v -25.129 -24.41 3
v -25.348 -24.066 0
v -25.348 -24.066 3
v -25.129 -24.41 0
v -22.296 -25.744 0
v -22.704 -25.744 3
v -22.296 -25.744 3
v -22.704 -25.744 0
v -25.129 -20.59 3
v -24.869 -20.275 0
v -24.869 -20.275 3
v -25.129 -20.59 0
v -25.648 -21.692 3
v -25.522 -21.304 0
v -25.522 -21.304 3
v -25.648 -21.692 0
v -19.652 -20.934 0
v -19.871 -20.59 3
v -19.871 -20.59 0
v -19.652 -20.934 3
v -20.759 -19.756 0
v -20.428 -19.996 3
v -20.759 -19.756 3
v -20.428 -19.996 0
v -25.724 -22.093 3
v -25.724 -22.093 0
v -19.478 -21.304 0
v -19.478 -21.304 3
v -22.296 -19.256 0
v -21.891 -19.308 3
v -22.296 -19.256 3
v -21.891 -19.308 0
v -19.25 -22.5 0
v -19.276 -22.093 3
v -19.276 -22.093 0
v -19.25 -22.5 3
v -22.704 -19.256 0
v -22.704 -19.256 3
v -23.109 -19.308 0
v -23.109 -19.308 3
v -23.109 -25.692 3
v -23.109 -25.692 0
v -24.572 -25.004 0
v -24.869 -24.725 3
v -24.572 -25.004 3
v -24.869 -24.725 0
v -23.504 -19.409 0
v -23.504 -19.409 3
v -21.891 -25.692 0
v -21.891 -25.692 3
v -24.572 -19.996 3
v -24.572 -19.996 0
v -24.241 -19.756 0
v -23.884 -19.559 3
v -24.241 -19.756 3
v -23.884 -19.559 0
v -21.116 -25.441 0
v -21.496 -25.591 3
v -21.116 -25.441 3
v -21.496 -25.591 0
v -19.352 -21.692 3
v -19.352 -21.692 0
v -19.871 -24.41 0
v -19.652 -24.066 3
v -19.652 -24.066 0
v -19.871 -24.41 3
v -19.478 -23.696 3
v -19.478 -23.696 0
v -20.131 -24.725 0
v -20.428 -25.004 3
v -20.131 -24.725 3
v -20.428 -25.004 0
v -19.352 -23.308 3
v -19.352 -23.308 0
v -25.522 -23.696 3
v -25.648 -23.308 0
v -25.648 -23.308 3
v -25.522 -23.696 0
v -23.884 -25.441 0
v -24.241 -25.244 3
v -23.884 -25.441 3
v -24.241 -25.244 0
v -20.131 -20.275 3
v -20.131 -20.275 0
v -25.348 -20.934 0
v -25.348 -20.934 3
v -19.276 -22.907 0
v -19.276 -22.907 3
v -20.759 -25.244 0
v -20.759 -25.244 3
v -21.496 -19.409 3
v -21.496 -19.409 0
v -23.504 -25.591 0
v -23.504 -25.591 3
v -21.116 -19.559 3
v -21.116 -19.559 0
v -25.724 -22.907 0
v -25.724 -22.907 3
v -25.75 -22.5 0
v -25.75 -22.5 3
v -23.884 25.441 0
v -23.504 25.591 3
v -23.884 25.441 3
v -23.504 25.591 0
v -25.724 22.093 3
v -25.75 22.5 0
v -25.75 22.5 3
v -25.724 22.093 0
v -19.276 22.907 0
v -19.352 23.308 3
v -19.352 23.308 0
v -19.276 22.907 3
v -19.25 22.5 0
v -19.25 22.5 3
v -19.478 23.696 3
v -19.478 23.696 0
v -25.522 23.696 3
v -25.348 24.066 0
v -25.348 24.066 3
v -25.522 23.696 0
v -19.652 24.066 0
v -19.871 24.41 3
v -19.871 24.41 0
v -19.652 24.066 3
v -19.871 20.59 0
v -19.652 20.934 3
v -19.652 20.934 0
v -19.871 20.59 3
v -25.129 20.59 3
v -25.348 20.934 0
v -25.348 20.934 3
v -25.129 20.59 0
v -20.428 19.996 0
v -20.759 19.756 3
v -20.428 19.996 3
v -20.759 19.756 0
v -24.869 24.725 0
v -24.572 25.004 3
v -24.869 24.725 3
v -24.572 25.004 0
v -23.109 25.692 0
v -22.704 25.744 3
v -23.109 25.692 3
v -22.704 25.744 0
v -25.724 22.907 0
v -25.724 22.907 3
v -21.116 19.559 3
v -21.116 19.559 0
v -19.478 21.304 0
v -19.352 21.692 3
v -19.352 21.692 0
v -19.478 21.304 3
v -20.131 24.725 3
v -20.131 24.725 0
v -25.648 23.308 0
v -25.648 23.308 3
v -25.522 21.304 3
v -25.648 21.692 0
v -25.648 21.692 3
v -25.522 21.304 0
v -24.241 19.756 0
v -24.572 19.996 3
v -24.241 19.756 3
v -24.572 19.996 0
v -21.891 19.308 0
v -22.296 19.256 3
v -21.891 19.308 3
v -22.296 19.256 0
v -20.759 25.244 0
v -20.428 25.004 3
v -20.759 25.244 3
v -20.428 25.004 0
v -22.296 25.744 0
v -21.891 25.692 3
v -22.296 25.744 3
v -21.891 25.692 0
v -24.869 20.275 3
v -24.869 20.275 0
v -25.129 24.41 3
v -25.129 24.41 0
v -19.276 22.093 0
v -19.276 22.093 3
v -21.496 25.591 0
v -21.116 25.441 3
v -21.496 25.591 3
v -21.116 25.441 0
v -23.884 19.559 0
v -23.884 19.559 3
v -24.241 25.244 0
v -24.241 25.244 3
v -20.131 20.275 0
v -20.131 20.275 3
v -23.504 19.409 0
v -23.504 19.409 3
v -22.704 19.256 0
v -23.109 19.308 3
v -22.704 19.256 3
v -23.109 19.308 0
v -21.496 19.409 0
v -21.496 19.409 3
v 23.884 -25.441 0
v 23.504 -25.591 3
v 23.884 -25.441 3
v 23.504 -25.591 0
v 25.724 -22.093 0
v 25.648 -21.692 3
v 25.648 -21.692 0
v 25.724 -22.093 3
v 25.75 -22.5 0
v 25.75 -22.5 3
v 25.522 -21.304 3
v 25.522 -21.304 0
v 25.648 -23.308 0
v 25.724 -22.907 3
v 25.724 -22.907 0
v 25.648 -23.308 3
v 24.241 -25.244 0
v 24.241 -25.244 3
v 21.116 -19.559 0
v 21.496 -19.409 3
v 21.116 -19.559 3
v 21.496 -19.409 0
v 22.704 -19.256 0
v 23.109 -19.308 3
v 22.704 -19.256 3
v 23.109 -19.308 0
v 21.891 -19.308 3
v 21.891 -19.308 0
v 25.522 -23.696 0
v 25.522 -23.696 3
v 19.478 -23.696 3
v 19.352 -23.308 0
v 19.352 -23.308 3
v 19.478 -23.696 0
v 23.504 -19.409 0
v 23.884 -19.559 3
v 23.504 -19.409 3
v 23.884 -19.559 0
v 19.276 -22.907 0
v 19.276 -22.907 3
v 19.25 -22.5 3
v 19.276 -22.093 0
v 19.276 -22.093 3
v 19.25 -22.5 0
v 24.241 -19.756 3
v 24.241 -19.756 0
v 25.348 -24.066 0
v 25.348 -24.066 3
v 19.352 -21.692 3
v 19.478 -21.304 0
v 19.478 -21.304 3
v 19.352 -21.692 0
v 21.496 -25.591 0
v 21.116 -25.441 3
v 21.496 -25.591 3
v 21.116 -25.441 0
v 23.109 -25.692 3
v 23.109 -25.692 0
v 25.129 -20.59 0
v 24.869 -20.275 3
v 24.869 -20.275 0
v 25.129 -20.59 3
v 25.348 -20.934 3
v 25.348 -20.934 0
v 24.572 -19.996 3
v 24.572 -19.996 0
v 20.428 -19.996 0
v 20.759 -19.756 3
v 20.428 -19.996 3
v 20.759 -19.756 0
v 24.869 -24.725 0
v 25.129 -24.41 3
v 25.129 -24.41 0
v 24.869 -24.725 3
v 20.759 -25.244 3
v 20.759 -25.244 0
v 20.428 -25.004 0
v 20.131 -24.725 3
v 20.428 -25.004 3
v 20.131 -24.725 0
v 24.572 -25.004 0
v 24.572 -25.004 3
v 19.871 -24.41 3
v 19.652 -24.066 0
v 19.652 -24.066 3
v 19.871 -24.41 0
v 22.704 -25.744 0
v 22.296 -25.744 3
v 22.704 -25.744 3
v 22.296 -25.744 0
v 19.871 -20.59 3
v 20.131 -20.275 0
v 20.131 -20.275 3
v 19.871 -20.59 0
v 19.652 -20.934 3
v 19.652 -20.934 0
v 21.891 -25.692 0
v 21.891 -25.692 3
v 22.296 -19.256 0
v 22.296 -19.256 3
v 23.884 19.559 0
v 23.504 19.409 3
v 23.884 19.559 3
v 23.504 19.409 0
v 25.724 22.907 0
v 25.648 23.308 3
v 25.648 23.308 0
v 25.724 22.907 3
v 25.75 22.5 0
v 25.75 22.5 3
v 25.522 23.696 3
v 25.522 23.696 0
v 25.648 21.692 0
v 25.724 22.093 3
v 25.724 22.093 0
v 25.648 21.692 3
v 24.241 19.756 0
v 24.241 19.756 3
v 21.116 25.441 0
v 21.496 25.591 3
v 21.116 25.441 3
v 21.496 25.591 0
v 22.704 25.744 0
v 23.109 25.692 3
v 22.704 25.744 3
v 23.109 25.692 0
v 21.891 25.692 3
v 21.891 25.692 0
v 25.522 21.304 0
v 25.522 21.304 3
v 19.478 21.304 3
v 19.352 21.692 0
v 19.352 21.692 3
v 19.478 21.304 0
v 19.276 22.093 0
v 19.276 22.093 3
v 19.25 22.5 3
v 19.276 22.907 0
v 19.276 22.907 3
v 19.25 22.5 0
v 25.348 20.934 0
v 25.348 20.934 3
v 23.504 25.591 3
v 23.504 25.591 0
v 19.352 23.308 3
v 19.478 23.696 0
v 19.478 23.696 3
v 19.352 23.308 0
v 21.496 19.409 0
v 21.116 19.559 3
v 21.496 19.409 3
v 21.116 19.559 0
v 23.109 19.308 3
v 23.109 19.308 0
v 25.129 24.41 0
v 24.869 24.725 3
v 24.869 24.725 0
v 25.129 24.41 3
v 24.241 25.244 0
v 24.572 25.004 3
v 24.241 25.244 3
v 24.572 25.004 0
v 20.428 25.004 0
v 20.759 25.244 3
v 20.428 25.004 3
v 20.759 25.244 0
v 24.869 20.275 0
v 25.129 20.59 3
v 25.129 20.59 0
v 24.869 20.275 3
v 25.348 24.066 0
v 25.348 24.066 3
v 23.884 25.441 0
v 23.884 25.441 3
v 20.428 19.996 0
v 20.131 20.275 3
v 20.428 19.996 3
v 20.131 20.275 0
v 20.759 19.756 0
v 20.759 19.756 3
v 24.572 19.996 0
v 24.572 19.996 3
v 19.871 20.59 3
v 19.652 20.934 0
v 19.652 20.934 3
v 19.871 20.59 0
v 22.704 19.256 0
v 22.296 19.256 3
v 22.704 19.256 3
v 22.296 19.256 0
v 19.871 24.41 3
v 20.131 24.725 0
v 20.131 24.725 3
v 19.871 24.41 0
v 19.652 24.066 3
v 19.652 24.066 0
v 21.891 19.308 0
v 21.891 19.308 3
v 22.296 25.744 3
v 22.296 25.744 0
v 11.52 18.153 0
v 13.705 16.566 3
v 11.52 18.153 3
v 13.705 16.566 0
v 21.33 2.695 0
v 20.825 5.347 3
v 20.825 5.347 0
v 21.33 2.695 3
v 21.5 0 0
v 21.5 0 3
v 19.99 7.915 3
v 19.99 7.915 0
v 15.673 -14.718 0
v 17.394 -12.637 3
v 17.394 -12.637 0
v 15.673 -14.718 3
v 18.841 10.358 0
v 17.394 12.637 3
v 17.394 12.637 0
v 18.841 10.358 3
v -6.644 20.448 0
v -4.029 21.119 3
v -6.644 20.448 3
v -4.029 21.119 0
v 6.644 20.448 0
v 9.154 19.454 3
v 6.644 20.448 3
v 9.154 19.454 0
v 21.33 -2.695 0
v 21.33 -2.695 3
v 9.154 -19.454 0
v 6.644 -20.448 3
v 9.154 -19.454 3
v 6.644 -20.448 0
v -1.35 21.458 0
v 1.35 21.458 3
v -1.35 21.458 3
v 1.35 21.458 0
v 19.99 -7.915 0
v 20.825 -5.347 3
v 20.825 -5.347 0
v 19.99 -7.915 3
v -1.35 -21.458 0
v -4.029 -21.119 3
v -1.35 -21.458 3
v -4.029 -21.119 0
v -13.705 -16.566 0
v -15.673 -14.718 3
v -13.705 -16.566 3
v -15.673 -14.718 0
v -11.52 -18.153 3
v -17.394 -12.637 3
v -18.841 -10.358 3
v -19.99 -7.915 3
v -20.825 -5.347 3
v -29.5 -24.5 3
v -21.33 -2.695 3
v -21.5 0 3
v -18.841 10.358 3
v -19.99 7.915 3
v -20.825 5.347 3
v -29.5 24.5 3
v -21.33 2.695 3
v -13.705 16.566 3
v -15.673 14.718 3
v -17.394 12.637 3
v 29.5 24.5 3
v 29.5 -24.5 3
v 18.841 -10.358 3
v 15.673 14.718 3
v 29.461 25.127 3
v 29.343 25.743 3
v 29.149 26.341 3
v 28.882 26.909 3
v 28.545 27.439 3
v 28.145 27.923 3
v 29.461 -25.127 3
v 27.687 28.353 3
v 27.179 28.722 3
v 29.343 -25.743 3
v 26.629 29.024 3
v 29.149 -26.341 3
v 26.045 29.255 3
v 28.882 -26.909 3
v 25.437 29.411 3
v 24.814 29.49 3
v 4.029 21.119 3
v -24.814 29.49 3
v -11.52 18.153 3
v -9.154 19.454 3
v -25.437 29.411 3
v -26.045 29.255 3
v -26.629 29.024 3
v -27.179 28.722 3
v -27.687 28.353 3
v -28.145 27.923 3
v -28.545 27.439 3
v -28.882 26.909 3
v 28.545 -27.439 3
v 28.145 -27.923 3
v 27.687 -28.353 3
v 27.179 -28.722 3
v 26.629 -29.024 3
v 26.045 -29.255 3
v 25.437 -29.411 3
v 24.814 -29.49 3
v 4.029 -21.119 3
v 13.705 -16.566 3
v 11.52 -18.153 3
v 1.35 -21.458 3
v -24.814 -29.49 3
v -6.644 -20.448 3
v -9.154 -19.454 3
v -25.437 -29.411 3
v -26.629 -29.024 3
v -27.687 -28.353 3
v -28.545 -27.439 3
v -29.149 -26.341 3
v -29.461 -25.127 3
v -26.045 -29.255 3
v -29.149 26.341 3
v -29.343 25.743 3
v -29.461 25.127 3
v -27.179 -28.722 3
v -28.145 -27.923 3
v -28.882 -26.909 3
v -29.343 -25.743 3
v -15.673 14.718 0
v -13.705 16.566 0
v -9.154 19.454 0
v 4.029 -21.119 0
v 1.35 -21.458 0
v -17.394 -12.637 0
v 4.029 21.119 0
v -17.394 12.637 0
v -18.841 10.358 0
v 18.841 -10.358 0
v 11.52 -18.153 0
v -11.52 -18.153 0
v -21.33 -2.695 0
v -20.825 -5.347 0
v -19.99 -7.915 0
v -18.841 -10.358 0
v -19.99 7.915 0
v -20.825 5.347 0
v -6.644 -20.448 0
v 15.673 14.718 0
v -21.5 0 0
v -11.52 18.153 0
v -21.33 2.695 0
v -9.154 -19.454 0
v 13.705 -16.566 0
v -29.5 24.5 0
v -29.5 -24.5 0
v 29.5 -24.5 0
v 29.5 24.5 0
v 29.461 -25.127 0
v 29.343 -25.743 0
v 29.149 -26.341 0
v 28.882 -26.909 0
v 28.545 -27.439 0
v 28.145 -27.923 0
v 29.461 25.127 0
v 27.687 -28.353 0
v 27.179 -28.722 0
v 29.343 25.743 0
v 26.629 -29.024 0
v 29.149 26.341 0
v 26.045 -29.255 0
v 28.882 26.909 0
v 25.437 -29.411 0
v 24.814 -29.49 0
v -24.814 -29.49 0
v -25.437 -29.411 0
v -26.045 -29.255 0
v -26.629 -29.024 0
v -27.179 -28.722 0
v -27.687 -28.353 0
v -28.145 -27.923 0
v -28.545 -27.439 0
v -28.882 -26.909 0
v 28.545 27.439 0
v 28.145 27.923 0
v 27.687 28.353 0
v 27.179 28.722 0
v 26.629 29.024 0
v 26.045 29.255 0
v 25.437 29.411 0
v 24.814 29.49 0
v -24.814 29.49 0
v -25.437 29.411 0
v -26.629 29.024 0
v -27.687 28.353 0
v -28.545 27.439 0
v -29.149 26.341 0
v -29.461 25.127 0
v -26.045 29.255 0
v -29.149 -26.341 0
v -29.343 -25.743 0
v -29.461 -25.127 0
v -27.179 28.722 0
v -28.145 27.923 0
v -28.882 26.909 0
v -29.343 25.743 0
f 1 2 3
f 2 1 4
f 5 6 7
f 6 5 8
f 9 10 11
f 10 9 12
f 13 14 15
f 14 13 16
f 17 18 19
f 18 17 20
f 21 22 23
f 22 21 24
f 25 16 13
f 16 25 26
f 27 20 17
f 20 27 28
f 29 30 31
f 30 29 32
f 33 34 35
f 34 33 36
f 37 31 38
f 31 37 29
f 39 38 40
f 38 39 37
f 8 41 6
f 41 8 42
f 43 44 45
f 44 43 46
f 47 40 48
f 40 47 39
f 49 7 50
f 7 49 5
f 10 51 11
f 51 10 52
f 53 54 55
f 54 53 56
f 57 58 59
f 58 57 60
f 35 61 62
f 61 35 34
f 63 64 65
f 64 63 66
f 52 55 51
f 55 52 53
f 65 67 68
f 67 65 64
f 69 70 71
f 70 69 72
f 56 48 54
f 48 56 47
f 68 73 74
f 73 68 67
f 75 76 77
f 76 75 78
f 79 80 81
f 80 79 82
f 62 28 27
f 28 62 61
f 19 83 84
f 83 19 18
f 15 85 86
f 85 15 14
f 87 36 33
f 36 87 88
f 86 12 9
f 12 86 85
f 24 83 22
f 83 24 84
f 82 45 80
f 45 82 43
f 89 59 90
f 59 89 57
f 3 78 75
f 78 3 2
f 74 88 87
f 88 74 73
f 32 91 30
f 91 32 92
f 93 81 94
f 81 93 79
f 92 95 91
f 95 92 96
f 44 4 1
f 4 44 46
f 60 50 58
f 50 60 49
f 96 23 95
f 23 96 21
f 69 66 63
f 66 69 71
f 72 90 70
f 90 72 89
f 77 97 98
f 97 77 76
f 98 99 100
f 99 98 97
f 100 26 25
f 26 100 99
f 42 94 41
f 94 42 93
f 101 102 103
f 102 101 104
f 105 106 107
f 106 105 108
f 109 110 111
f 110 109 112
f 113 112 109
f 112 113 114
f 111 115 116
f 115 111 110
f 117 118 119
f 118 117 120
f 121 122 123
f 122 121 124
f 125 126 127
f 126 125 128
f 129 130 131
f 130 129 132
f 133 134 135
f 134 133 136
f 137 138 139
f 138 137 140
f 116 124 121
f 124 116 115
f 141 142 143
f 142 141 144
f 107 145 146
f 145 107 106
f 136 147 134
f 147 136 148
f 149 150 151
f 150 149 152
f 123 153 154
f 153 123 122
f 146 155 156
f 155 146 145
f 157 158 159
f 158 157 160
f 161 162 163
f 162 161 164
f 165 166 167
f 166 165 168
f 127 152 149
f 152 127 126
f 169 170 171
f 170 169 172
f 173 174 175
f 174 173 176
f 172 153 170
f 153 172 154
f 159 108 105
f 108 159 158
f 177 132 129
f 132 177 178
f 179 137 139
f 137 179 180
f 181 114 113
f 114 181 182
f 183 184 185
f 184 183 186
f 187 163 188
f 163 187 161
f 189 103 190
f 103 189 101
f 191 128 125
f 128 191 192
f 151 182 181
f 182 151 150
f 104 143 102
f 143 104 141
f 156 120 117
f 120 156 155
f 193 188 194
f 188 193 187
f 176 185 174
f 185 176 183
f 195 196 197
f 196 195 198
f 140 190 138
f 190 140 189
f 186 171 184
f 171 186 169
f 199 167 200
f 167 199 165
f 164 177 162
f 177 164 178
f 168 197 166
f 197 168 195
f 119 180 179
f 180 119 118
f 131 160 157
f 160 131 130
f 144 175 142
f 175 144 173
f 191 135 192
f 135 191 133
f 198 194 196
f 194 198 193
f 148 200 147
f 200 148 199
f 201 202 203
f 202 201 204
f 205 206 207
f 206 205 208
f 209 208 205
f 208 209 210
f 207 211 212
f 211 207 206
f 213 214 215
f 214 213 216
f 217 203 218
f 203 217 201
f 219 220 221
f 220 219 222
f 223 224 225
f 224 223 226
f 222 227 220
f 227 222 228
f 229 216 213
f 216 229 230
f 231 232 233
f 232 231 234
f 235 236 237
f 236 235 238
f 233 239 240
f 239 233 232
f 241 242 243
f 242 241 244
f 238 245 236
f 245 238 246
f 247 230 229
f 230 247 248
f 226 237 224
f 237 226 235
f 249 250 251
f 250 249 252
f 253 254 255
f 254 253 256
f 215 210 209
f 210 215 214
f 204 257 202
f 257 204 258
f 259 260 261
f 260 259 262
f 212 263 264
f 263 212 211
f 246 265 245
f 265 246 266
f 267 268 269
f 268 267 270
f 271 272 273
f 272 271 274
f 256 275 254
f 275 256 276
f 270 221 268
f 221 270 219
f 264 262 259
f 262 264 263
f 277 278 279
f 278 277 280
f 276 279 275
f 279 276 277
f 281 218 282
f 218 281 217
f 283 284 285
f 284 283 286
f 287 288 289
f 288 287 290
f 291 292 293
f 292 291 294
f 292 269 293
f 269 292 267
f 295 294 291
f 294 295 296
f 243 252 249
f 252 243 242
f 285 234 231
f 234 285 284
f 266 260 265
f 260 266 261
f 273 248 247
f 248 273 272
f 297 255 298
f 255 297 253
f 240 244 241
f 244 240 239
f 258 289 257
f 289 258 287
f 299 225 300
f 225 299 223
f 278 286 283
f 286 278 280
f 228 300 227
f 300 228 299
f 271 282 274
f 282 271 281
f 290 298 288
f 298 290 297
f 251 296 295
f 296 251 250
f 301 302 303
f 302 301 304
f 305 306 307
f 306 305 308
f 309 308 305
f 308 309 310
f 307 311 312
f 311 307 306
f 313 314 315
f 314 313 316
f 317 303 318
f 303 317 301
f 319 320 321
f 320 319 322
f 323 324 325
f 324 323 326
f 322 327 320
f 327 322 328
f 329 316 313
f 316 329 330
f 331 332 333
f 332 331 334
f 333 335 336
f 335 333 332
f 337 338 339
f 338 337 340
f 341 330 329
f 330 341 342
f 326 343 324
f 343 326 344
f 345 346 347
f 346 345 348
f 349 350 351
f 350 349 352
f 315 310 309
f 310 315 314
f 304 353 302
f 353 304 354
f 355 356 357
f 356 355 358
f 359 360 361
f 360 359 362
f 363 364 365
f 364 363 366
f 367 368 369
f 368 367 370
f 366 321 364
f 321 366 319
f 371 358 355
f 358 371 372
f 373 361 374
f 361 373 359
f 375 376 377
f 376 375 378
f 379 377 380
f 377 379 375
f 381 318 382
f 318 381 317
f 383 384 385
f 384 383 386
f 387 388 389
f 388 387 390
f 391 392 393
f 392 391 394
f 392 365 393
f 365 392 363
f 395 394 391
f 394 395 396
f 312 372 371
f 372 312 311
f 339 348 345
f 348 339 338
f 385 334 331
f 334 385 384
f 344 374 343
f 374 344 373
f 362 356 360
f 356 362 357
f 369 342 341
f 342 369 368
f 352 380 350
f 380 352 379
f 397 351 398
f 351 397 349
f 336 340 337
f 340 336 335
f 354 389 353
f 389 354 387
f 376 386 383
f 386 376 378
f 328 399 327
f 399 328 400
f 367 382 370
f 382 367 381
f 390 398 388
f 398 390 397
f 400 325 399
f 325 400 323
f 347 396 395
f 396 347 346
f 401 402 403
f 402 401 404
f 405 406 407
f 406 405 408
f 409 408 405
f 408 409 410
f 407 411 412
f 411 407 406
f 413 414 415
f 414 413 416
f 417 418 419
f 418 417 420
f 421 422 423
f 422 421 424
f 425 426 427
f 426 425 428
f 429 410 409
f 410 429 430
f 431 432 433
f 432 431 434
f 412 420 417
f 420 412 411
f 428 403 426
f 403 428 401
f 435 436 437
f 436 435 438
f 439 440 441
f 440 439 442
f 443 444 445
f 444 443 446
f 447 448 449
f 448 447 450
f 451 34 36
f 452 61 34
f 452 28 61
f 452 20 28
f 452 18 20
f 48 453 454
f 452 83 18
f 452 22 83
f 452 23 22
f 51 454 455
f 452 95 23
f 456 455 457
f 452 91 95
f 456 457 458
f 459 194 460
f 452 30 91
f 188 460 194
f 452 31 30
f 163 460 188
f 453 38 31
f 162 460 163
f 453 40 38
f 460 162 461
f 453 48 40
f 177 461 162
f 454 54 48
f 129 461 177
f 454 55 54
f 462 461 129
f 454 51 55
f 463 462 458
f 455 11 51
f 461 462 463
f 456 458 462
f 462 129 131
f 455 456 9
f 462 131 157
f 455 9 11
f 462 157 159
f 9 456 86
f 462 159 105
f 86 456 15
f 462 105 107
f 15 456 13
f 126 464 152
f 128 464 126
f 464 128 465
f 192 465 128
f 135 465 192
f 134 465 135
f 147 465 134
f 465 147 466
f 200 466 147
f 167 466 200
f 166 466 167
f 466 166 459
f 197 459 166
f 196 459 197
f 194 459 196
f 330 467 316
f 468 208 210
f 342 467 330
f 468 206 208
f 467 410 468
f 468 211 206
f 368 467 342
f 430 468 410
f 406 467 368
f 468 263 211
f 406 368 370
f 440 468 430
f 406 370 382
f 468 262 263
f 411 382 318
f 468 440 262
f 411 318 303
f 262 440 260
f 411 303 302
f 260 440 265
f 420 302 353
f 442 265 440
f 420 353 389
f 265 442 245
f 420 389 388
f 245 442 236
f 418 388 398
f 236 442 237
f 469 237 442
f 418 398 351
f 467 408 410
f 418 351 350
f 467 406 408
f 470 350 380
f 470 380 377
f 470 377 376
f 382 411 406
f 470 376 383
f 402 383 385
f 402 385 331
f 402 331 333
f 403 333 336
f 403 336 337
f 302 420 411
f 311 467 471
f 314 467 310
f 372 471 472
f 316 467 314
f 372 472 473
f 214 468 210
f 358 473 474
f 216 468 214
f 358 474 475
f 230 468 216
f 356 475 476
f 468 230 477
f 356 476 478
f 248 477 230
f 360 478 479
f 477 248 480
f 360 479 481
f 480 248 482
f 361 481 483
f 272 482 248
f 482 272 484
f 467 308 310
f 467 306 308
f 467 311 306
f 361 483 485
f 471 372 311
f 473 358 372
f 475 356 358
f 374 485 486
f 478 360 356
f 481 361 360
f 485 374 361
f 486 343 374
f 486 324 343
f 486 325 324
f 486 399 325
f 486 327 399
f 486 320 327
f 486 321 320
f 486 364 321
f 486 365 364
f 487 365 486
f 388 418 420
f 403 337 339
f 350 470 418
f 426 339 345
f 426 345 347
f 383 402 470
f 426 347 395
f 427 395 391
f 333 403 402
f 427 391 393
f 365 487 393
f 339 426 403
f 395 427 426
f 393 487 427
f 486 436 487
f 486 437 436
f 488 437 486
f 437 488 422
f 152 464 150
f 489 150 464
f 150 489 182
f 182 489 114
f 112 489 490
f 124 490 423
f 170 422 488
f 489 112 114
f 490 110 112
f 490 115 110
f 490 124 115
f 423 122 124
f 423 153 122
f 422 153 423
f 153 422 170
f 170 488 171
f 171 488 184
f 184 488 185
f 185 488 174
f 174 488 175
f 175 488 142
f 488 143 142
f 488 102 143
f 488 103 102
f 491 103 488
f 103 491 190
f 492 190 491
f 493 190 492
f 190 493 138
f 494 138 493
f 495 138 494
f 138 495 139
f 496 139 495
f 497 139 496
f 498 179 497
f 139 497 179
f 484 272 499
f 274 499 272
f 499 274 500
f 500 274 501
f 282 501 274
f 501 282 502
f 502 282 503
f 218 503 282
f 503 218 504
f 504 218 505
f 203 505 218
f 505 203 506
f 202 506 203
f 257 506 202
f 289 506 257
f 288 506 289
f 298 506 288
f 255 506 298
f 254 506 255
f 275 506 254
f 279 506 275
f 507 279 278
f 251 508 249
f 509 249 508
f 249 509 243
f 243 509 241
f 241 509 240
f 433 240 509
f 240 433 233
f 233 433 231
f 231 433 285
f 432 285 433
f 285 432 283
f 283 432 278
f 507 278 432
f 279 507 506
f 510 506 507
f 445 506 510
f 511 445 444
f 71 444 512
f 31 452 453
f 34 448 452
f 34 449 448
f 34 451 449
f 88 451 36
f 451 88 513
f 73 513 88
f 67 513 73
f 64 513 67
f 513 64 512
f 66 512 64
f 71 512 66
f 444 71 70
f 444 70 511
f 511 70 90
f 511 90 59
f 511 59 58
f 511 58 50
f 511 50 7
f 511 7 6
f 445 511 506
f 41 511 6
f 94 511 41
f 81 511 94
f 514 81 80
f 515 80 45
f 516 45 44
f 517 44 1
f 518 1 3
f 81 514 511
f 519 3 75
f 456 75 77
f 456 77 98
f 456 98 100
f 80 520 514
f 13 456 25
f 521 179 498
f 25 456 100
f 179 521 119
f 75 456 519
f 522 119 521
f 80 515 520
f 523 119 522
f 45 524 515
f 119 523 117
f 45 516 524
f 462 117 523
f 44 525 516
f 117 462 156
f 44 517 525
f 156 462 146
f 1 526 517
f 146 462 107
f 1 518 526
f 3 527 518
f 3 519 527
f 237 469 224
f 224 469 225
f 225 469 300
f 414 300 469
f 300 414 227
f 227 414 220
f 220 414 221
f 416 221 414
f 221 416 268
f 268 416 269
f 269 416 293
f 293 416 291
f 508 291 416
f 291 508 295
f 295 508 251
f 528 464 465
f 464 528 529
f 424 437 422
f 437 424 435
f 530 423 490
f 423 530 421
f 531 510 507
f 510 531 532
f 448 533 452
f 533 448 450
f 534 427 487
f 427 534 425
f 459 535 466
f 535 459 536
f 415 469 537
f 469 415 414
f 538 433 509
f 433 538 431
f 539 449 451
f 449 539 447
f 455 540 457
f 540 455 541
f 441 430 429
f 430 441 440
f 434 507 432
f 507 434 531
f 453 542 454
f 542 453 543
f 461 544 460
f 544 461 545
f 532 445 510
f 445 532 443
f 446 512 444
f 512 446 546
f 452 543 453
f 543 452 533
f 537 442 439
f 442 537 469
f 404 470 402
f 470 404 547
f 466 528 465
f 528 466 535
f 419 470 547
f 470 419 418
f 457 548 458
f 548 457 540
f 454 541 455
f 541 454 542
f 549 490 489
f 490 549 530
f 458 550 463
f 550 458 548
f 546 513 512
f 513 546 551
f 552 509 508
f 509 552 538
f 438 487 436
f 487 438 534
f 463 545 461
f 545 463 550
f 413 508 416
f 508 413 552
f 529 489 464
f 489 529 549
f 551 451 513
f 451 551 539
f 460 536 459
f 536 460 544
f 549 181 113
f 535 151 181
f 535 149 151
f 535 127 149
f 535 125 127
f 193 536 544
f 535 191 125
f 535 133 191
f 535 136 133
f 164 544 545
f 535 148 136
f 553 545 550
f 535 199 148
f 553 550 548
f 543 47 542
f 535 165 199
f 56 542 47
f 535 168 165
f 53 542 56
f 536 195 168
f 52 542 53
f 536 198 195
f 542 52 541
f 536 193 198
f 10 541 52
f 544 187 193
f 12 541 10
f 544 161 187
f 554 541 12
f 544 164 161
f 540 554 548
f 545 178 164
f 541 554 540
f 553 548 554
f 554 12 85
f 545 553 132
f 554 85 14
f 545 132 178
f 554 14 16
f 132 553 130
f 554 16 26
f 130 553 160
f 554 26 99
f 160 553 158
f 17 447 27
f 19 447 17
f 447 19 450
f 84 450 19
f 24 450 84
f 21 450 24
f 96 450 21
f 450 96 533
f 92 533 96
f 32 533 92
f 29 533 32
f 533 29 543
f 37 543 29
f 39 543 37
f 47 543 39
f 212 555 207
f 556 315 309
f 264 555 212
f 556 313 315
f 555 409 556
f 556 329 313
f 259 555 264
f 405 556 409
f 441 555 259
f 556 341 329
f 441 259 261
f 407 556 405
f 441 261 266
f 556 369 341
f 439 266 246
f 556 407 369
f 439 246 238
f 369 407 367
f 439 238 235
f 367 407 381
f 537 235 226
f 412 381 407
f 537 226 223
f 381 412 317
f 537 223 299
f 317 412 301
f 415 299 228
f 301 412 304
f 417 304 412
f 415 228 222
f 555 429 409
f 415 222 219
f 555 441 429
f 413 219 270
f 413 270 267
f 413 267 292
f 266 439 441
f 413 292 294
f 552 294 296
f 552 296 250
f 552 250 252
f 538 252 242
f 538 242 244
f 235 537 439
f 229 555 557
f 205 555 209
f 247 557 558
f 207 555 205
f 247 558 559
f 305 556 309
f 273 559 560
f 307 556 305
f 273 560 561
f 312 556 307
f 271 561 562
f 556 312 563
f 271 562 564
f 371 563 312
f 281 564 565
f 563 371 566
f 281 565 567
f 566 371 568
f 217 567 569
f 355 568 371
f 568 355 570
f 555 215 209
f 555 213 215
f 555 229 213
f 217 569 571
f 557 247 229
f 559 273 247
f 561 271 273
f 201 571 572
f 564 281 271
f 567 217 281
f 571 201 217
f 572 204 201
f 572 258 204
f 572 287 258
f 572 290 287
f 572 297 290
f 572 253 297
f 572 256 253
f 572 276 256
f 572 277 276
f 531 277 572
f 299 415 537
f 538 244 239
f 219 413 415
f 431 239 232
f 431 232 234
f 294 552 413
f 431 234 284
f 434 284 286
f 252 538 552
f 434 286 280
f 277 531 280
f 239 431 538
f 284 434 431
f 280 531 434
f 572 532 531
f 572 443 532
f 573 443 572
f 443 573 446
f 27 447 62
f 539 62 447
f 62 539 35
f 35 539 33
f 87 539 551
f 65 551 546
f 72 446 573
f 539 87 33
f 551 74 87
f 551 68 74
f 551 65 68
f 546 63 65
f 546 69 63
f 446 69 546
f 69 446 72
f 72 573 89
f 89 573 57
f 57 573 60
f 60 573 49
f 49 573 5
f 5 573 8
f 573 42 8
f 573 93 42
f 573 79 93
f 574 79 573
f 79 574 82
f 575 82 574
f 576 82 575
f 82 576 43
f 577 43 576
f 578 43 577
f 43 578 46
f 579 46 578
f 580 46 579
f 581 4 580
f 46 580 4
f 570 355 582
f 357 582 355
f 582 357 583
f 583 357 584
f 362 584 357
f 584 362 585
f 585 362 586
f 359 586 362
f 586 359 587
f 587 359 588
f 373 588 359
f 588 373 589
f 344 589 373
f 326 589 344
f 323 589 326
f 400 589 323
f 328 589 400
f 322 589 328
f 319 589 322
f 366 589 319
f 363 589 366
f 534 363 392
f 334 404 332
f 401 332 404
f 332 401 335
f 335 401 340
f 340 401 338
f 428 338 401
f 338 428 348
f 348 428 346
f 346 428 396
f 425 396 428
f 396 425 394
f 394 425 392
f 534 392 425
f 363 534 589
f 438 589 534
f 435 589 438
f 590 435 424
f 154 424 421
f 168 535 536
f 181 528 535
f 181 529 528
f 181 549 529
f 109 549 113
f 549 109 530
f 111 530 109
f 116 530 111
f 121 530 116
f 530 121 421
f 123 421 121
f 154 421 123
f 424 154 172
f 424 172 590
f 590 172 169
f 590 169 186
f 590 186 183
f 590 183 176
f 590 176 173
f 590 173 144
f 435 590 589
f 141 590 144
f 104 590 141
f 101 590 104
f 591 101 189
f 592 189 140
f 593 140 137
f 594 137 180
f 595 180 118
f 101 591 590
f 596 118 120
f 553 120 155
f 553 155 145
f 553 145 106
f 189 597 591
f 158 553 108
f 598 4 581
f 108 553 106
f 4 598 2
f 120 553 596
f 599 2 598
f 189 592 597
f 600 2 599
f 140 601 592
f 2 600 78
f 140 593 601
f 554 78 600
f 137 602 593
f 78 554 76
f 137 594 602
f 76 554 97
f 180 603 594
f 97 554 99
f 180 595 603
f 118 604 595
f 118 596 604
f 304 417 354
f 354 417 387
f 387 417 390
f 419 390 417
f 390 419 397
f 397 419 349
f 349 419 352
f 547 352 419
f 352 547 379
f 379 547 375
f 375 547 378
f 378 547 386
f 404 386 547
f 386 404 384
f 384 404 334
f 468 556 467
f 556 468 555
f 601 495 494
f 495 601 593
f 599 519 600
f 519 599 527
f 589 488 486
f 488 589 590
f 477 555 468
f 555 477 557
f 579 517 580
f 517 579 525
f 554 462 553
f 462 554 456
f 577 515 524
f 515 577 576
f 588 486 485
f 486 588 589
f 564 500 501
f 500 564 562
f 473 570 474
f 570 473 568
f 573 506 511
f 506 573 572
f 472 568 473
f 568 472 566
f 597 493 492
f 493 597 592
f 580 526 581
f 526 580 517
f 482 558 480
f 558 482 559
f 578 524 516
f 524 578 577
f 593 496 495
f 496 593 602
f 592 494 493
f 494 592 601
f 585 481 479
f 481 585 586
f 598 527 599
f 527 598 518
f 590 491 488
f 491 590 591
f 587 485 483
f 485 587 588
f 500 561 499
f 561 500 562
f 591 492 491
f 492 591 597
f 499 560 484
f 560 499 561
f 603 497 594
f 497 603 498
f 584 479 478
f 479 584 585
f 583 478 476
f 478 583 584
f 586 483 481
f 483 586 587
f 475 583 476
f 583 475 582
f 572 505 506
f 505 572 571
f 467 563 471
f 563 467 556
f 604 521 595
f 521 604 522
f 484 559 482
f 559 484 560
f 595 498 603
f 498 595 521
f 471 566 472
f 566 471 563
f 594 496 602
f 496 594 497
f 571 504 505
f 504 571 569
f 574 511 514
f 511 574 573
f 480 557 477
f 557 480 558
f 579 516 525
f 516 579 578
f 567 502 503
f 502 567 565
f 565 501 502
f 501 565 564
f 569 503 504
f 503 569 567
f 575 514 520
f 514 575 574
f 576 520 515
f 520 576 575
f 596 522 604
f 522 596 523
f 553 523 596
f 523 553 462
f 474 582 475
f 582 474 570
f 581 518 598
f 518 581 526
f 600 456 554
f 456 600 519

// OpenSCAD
$fn = 50;


difference() {
	union() {
		hull() {
			translate(v = [-24.5000000000, 24.5000000000, 0]) {
				cylinder(h = 3, r = 5);
			}
			translate(v = [24.5000000000, 24.5000000000, 0]) {
				cylinder(h = 3, r = 5);
			}
			translate(v = [-24.5000000000, -24.5000000000, 0]) {
				cylinder(h = 3, r = 5);
			}
			translate(v = [24.5000000000, -24.5000000000, 0]) {
				cylinder(h = 3, r = 5);
			}
		}
	}
	union() {
		#translate(v = [-22.5000000000, -22.5000000000, -100.0000000000]) {
			cylinder(h = 200, r = 3.2500000000);
		}
		#translate(v = [-22.5000000000, 22.5000000000, -100.0000000000]) {
			cylinder(h = 200, r = 3.2500000000);
		}
		#translate(v = [22.5000000000, -22.5000000000, -100.0000000000]) {
			cylinder(h = 200, r = 3.2500000000);
		}
		#translate(v = [22.5000000000, 22.5000000000, -100.0000000000]) {
			cylinder(h = 200, r = 3.2500000000);
		}
		#cylinder(h = 3, r = 21.5000000000);
	}
}
